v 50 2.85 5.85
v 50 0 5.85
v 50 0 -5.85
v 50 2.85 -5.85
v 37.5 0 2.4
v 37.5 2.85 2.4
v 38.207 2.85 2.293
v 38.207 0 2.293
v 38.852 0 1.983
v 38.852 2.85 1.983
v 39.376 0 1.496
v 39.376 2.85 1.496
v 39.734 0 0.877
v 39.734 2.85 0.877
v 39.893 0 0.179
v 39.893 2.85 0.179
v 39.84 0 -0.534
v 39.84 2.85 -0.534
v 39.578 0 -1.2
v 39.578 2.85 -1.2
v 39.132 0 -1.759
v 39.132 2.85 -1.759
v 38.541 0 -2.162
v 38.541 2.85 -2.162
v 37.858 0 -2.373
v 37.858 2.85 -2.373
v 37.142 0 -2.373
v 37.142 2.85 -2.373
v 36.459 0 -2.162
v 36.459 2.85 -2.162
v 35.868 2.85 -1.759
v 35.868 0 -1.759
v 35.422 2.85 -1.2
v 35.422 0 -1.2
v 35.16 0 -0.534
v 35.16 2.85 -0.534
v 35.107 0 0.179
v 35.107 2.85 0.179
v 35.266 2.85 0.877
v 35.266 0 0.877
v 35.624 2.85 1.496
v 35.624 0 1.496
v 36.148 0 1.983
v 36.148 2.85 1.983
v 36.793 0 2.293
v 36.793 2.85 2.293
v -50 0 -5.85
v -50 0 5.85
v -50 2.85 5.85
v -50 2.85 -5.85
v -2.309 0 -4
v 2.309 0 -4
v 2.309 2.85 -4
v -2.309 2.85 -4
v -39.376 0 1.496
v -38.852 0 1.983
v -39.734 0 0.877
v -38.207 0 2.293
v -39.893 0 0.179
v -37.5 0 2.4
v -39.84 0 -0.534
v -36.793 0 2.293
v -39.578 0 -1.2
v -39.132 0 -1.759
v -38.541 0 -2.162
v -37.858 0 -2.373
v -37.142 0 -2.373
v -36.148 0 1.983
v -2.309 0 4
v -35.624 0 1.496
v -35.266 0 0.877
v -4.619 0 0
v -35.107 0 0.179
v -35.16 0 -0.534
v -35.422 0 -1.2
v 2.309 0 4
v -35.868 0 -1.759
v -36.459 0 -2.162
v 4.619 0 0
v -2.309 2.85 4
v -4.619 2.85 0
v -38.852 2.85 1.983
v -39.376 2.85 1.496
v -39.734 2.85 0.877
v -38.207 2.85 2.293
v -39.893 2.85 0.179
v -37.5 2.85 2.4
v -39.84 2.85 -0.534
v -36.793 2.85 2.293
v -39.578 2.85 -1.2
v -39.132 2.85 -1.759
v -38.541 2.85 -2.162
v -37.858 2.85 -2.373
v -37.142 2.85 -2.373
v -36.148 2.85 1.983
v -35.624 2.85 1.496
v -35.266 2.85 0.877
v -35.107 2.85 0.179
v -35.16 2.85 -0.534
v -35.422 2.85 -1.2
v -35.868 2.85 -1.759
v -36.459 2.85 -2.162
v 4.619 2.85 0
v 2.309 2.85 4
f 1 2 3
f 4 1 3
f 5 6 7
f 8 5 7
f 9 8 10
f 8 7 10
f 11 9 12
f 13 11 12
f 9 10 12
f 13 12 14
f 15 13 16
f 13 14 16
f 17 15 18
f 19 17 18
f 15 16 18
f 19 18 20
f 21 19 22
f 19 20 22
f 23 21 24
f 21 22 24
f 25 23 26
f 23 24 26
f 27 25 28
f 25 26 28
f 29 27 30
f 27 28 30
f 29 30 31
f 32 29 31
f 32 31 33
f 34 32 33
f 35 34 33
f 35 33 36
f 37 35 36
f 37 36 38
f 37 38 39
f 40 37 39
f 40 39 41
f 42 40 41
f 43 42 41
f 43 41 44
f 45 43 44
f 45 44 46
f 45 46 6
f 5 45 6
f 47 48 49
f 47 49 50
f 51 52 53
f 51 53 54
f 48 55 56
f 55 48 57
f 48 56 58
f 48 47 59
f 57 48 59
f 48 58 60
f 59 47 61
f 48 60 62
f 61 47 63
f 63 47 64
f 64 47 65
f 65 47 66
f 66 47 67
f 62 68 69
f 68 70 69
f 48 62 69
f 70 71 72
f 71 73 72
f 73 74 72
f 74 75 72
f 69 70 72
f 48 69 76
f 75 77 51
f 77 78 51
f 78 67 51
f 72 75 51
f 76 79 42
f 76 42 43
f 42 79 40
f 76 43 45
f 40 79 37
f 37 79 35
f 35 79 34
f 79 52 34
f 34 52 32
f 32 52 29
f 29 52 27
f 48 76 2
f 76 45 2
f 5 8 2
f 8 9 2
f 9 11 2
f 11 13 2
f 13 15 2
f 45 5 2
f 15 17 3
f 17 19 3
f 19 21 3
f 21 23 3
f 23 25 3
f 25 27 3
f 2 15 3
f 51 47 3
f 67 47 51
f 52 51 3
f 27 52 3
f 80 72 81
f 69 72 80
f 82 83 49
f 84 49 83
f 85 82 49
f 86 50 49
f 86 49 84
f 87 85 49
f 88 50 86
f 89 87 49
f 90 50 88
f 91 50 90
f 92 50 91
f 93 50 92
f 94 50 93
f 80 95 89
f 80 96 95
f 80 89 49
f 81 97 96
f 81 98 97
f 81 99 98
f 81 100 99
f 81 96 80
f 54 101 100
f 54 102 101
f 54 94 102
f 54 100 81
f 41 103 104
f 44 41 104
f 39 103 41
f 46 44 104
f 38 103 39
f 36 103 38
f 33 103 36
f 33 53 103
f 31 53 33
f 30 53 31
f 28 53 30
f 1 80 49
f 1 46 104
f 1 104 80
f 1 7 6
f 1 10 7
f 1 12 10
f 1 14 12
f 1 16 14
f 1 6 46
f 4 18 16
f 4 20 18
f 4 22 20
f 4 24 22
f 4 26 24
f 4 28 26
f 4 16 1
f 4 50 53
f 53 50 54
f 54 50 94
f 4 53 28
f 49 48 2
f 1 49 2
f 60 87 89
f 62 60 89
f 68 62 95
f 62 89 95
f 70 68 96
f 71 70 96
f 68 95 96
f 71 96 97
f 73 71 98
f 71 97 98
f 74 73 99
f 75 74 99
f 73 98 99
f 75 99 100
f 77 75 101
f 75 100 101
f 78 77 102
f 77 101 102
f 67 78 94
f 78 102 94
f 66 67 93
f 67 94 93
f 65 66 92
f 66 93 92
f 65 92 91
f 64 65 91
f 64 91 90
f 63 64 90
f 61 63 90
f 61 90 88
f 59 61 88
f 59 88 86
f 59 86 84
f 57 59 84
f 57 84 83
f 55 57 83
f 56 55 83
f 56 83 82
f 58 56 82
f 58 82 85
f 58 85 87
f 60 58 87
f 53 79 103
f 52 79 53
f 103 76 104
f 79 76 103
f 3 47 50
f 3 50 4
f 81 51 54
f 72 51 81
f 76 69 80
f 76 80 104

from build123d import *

# Parameters (mm, degrees)
SKETCH1_W           = 100
SKETCH1_H           = 11.7
BOSS_EXTRUDE1_DEPTH = 2.85
CUT_EXTRUDE1_DEPTH  = 51.421671928
SKETCH3_R           = 2.4
CUT_EXTRUDE2_DEPTH  = 51.421671928


with BuildPart() as part:
    # Sketch1 → Boss-Extrude1 (new body)
    with BuildSketch(Plane(origin=(0, 0, 0), x_dir=(1, 0, 0), z_dir=(0, 1, 0))):
        Rectangle(SKETCH1_W, SKETCH1_H)
    extrude(amount=BOSS_EXTRUDE1_DEPTH)

    # Sketch2 → Cut-Extrude1 (cut, through all)
    with BuildSketch(Plane.XZ):
        Polygon((-2.309401077, 4), (2.309401077, 4), (4.618802154, 0), (2.309401077, -4), (-2.309401077, -4), (-4.618802154, 0), align=None)
    extrude(amount=-CUT_EXTRUDE1_DEPTH, mode=Mode.SUBTRACT)

    # Sketch3 → Cut-Extrude2 (cut, through all)
    with BuildSketch(Plane(origin=(0, 2.85, 0), x_dir=(1, 0, 0), z_dir=(0, 1, 0))):
        with Locations(Location((-37.5, 0, 0), (0, 0, 270))):
            Circle(SKETCH3_R)
        with Locations(Location((37.5, 0, 0), (0, 0, 270))):
            Circle(SKETCH3_R)
    extrude(amount=-CUT_EXTRUDE2_DEPTH, mode=Mode.SUBTRACT)


solid = part.part
